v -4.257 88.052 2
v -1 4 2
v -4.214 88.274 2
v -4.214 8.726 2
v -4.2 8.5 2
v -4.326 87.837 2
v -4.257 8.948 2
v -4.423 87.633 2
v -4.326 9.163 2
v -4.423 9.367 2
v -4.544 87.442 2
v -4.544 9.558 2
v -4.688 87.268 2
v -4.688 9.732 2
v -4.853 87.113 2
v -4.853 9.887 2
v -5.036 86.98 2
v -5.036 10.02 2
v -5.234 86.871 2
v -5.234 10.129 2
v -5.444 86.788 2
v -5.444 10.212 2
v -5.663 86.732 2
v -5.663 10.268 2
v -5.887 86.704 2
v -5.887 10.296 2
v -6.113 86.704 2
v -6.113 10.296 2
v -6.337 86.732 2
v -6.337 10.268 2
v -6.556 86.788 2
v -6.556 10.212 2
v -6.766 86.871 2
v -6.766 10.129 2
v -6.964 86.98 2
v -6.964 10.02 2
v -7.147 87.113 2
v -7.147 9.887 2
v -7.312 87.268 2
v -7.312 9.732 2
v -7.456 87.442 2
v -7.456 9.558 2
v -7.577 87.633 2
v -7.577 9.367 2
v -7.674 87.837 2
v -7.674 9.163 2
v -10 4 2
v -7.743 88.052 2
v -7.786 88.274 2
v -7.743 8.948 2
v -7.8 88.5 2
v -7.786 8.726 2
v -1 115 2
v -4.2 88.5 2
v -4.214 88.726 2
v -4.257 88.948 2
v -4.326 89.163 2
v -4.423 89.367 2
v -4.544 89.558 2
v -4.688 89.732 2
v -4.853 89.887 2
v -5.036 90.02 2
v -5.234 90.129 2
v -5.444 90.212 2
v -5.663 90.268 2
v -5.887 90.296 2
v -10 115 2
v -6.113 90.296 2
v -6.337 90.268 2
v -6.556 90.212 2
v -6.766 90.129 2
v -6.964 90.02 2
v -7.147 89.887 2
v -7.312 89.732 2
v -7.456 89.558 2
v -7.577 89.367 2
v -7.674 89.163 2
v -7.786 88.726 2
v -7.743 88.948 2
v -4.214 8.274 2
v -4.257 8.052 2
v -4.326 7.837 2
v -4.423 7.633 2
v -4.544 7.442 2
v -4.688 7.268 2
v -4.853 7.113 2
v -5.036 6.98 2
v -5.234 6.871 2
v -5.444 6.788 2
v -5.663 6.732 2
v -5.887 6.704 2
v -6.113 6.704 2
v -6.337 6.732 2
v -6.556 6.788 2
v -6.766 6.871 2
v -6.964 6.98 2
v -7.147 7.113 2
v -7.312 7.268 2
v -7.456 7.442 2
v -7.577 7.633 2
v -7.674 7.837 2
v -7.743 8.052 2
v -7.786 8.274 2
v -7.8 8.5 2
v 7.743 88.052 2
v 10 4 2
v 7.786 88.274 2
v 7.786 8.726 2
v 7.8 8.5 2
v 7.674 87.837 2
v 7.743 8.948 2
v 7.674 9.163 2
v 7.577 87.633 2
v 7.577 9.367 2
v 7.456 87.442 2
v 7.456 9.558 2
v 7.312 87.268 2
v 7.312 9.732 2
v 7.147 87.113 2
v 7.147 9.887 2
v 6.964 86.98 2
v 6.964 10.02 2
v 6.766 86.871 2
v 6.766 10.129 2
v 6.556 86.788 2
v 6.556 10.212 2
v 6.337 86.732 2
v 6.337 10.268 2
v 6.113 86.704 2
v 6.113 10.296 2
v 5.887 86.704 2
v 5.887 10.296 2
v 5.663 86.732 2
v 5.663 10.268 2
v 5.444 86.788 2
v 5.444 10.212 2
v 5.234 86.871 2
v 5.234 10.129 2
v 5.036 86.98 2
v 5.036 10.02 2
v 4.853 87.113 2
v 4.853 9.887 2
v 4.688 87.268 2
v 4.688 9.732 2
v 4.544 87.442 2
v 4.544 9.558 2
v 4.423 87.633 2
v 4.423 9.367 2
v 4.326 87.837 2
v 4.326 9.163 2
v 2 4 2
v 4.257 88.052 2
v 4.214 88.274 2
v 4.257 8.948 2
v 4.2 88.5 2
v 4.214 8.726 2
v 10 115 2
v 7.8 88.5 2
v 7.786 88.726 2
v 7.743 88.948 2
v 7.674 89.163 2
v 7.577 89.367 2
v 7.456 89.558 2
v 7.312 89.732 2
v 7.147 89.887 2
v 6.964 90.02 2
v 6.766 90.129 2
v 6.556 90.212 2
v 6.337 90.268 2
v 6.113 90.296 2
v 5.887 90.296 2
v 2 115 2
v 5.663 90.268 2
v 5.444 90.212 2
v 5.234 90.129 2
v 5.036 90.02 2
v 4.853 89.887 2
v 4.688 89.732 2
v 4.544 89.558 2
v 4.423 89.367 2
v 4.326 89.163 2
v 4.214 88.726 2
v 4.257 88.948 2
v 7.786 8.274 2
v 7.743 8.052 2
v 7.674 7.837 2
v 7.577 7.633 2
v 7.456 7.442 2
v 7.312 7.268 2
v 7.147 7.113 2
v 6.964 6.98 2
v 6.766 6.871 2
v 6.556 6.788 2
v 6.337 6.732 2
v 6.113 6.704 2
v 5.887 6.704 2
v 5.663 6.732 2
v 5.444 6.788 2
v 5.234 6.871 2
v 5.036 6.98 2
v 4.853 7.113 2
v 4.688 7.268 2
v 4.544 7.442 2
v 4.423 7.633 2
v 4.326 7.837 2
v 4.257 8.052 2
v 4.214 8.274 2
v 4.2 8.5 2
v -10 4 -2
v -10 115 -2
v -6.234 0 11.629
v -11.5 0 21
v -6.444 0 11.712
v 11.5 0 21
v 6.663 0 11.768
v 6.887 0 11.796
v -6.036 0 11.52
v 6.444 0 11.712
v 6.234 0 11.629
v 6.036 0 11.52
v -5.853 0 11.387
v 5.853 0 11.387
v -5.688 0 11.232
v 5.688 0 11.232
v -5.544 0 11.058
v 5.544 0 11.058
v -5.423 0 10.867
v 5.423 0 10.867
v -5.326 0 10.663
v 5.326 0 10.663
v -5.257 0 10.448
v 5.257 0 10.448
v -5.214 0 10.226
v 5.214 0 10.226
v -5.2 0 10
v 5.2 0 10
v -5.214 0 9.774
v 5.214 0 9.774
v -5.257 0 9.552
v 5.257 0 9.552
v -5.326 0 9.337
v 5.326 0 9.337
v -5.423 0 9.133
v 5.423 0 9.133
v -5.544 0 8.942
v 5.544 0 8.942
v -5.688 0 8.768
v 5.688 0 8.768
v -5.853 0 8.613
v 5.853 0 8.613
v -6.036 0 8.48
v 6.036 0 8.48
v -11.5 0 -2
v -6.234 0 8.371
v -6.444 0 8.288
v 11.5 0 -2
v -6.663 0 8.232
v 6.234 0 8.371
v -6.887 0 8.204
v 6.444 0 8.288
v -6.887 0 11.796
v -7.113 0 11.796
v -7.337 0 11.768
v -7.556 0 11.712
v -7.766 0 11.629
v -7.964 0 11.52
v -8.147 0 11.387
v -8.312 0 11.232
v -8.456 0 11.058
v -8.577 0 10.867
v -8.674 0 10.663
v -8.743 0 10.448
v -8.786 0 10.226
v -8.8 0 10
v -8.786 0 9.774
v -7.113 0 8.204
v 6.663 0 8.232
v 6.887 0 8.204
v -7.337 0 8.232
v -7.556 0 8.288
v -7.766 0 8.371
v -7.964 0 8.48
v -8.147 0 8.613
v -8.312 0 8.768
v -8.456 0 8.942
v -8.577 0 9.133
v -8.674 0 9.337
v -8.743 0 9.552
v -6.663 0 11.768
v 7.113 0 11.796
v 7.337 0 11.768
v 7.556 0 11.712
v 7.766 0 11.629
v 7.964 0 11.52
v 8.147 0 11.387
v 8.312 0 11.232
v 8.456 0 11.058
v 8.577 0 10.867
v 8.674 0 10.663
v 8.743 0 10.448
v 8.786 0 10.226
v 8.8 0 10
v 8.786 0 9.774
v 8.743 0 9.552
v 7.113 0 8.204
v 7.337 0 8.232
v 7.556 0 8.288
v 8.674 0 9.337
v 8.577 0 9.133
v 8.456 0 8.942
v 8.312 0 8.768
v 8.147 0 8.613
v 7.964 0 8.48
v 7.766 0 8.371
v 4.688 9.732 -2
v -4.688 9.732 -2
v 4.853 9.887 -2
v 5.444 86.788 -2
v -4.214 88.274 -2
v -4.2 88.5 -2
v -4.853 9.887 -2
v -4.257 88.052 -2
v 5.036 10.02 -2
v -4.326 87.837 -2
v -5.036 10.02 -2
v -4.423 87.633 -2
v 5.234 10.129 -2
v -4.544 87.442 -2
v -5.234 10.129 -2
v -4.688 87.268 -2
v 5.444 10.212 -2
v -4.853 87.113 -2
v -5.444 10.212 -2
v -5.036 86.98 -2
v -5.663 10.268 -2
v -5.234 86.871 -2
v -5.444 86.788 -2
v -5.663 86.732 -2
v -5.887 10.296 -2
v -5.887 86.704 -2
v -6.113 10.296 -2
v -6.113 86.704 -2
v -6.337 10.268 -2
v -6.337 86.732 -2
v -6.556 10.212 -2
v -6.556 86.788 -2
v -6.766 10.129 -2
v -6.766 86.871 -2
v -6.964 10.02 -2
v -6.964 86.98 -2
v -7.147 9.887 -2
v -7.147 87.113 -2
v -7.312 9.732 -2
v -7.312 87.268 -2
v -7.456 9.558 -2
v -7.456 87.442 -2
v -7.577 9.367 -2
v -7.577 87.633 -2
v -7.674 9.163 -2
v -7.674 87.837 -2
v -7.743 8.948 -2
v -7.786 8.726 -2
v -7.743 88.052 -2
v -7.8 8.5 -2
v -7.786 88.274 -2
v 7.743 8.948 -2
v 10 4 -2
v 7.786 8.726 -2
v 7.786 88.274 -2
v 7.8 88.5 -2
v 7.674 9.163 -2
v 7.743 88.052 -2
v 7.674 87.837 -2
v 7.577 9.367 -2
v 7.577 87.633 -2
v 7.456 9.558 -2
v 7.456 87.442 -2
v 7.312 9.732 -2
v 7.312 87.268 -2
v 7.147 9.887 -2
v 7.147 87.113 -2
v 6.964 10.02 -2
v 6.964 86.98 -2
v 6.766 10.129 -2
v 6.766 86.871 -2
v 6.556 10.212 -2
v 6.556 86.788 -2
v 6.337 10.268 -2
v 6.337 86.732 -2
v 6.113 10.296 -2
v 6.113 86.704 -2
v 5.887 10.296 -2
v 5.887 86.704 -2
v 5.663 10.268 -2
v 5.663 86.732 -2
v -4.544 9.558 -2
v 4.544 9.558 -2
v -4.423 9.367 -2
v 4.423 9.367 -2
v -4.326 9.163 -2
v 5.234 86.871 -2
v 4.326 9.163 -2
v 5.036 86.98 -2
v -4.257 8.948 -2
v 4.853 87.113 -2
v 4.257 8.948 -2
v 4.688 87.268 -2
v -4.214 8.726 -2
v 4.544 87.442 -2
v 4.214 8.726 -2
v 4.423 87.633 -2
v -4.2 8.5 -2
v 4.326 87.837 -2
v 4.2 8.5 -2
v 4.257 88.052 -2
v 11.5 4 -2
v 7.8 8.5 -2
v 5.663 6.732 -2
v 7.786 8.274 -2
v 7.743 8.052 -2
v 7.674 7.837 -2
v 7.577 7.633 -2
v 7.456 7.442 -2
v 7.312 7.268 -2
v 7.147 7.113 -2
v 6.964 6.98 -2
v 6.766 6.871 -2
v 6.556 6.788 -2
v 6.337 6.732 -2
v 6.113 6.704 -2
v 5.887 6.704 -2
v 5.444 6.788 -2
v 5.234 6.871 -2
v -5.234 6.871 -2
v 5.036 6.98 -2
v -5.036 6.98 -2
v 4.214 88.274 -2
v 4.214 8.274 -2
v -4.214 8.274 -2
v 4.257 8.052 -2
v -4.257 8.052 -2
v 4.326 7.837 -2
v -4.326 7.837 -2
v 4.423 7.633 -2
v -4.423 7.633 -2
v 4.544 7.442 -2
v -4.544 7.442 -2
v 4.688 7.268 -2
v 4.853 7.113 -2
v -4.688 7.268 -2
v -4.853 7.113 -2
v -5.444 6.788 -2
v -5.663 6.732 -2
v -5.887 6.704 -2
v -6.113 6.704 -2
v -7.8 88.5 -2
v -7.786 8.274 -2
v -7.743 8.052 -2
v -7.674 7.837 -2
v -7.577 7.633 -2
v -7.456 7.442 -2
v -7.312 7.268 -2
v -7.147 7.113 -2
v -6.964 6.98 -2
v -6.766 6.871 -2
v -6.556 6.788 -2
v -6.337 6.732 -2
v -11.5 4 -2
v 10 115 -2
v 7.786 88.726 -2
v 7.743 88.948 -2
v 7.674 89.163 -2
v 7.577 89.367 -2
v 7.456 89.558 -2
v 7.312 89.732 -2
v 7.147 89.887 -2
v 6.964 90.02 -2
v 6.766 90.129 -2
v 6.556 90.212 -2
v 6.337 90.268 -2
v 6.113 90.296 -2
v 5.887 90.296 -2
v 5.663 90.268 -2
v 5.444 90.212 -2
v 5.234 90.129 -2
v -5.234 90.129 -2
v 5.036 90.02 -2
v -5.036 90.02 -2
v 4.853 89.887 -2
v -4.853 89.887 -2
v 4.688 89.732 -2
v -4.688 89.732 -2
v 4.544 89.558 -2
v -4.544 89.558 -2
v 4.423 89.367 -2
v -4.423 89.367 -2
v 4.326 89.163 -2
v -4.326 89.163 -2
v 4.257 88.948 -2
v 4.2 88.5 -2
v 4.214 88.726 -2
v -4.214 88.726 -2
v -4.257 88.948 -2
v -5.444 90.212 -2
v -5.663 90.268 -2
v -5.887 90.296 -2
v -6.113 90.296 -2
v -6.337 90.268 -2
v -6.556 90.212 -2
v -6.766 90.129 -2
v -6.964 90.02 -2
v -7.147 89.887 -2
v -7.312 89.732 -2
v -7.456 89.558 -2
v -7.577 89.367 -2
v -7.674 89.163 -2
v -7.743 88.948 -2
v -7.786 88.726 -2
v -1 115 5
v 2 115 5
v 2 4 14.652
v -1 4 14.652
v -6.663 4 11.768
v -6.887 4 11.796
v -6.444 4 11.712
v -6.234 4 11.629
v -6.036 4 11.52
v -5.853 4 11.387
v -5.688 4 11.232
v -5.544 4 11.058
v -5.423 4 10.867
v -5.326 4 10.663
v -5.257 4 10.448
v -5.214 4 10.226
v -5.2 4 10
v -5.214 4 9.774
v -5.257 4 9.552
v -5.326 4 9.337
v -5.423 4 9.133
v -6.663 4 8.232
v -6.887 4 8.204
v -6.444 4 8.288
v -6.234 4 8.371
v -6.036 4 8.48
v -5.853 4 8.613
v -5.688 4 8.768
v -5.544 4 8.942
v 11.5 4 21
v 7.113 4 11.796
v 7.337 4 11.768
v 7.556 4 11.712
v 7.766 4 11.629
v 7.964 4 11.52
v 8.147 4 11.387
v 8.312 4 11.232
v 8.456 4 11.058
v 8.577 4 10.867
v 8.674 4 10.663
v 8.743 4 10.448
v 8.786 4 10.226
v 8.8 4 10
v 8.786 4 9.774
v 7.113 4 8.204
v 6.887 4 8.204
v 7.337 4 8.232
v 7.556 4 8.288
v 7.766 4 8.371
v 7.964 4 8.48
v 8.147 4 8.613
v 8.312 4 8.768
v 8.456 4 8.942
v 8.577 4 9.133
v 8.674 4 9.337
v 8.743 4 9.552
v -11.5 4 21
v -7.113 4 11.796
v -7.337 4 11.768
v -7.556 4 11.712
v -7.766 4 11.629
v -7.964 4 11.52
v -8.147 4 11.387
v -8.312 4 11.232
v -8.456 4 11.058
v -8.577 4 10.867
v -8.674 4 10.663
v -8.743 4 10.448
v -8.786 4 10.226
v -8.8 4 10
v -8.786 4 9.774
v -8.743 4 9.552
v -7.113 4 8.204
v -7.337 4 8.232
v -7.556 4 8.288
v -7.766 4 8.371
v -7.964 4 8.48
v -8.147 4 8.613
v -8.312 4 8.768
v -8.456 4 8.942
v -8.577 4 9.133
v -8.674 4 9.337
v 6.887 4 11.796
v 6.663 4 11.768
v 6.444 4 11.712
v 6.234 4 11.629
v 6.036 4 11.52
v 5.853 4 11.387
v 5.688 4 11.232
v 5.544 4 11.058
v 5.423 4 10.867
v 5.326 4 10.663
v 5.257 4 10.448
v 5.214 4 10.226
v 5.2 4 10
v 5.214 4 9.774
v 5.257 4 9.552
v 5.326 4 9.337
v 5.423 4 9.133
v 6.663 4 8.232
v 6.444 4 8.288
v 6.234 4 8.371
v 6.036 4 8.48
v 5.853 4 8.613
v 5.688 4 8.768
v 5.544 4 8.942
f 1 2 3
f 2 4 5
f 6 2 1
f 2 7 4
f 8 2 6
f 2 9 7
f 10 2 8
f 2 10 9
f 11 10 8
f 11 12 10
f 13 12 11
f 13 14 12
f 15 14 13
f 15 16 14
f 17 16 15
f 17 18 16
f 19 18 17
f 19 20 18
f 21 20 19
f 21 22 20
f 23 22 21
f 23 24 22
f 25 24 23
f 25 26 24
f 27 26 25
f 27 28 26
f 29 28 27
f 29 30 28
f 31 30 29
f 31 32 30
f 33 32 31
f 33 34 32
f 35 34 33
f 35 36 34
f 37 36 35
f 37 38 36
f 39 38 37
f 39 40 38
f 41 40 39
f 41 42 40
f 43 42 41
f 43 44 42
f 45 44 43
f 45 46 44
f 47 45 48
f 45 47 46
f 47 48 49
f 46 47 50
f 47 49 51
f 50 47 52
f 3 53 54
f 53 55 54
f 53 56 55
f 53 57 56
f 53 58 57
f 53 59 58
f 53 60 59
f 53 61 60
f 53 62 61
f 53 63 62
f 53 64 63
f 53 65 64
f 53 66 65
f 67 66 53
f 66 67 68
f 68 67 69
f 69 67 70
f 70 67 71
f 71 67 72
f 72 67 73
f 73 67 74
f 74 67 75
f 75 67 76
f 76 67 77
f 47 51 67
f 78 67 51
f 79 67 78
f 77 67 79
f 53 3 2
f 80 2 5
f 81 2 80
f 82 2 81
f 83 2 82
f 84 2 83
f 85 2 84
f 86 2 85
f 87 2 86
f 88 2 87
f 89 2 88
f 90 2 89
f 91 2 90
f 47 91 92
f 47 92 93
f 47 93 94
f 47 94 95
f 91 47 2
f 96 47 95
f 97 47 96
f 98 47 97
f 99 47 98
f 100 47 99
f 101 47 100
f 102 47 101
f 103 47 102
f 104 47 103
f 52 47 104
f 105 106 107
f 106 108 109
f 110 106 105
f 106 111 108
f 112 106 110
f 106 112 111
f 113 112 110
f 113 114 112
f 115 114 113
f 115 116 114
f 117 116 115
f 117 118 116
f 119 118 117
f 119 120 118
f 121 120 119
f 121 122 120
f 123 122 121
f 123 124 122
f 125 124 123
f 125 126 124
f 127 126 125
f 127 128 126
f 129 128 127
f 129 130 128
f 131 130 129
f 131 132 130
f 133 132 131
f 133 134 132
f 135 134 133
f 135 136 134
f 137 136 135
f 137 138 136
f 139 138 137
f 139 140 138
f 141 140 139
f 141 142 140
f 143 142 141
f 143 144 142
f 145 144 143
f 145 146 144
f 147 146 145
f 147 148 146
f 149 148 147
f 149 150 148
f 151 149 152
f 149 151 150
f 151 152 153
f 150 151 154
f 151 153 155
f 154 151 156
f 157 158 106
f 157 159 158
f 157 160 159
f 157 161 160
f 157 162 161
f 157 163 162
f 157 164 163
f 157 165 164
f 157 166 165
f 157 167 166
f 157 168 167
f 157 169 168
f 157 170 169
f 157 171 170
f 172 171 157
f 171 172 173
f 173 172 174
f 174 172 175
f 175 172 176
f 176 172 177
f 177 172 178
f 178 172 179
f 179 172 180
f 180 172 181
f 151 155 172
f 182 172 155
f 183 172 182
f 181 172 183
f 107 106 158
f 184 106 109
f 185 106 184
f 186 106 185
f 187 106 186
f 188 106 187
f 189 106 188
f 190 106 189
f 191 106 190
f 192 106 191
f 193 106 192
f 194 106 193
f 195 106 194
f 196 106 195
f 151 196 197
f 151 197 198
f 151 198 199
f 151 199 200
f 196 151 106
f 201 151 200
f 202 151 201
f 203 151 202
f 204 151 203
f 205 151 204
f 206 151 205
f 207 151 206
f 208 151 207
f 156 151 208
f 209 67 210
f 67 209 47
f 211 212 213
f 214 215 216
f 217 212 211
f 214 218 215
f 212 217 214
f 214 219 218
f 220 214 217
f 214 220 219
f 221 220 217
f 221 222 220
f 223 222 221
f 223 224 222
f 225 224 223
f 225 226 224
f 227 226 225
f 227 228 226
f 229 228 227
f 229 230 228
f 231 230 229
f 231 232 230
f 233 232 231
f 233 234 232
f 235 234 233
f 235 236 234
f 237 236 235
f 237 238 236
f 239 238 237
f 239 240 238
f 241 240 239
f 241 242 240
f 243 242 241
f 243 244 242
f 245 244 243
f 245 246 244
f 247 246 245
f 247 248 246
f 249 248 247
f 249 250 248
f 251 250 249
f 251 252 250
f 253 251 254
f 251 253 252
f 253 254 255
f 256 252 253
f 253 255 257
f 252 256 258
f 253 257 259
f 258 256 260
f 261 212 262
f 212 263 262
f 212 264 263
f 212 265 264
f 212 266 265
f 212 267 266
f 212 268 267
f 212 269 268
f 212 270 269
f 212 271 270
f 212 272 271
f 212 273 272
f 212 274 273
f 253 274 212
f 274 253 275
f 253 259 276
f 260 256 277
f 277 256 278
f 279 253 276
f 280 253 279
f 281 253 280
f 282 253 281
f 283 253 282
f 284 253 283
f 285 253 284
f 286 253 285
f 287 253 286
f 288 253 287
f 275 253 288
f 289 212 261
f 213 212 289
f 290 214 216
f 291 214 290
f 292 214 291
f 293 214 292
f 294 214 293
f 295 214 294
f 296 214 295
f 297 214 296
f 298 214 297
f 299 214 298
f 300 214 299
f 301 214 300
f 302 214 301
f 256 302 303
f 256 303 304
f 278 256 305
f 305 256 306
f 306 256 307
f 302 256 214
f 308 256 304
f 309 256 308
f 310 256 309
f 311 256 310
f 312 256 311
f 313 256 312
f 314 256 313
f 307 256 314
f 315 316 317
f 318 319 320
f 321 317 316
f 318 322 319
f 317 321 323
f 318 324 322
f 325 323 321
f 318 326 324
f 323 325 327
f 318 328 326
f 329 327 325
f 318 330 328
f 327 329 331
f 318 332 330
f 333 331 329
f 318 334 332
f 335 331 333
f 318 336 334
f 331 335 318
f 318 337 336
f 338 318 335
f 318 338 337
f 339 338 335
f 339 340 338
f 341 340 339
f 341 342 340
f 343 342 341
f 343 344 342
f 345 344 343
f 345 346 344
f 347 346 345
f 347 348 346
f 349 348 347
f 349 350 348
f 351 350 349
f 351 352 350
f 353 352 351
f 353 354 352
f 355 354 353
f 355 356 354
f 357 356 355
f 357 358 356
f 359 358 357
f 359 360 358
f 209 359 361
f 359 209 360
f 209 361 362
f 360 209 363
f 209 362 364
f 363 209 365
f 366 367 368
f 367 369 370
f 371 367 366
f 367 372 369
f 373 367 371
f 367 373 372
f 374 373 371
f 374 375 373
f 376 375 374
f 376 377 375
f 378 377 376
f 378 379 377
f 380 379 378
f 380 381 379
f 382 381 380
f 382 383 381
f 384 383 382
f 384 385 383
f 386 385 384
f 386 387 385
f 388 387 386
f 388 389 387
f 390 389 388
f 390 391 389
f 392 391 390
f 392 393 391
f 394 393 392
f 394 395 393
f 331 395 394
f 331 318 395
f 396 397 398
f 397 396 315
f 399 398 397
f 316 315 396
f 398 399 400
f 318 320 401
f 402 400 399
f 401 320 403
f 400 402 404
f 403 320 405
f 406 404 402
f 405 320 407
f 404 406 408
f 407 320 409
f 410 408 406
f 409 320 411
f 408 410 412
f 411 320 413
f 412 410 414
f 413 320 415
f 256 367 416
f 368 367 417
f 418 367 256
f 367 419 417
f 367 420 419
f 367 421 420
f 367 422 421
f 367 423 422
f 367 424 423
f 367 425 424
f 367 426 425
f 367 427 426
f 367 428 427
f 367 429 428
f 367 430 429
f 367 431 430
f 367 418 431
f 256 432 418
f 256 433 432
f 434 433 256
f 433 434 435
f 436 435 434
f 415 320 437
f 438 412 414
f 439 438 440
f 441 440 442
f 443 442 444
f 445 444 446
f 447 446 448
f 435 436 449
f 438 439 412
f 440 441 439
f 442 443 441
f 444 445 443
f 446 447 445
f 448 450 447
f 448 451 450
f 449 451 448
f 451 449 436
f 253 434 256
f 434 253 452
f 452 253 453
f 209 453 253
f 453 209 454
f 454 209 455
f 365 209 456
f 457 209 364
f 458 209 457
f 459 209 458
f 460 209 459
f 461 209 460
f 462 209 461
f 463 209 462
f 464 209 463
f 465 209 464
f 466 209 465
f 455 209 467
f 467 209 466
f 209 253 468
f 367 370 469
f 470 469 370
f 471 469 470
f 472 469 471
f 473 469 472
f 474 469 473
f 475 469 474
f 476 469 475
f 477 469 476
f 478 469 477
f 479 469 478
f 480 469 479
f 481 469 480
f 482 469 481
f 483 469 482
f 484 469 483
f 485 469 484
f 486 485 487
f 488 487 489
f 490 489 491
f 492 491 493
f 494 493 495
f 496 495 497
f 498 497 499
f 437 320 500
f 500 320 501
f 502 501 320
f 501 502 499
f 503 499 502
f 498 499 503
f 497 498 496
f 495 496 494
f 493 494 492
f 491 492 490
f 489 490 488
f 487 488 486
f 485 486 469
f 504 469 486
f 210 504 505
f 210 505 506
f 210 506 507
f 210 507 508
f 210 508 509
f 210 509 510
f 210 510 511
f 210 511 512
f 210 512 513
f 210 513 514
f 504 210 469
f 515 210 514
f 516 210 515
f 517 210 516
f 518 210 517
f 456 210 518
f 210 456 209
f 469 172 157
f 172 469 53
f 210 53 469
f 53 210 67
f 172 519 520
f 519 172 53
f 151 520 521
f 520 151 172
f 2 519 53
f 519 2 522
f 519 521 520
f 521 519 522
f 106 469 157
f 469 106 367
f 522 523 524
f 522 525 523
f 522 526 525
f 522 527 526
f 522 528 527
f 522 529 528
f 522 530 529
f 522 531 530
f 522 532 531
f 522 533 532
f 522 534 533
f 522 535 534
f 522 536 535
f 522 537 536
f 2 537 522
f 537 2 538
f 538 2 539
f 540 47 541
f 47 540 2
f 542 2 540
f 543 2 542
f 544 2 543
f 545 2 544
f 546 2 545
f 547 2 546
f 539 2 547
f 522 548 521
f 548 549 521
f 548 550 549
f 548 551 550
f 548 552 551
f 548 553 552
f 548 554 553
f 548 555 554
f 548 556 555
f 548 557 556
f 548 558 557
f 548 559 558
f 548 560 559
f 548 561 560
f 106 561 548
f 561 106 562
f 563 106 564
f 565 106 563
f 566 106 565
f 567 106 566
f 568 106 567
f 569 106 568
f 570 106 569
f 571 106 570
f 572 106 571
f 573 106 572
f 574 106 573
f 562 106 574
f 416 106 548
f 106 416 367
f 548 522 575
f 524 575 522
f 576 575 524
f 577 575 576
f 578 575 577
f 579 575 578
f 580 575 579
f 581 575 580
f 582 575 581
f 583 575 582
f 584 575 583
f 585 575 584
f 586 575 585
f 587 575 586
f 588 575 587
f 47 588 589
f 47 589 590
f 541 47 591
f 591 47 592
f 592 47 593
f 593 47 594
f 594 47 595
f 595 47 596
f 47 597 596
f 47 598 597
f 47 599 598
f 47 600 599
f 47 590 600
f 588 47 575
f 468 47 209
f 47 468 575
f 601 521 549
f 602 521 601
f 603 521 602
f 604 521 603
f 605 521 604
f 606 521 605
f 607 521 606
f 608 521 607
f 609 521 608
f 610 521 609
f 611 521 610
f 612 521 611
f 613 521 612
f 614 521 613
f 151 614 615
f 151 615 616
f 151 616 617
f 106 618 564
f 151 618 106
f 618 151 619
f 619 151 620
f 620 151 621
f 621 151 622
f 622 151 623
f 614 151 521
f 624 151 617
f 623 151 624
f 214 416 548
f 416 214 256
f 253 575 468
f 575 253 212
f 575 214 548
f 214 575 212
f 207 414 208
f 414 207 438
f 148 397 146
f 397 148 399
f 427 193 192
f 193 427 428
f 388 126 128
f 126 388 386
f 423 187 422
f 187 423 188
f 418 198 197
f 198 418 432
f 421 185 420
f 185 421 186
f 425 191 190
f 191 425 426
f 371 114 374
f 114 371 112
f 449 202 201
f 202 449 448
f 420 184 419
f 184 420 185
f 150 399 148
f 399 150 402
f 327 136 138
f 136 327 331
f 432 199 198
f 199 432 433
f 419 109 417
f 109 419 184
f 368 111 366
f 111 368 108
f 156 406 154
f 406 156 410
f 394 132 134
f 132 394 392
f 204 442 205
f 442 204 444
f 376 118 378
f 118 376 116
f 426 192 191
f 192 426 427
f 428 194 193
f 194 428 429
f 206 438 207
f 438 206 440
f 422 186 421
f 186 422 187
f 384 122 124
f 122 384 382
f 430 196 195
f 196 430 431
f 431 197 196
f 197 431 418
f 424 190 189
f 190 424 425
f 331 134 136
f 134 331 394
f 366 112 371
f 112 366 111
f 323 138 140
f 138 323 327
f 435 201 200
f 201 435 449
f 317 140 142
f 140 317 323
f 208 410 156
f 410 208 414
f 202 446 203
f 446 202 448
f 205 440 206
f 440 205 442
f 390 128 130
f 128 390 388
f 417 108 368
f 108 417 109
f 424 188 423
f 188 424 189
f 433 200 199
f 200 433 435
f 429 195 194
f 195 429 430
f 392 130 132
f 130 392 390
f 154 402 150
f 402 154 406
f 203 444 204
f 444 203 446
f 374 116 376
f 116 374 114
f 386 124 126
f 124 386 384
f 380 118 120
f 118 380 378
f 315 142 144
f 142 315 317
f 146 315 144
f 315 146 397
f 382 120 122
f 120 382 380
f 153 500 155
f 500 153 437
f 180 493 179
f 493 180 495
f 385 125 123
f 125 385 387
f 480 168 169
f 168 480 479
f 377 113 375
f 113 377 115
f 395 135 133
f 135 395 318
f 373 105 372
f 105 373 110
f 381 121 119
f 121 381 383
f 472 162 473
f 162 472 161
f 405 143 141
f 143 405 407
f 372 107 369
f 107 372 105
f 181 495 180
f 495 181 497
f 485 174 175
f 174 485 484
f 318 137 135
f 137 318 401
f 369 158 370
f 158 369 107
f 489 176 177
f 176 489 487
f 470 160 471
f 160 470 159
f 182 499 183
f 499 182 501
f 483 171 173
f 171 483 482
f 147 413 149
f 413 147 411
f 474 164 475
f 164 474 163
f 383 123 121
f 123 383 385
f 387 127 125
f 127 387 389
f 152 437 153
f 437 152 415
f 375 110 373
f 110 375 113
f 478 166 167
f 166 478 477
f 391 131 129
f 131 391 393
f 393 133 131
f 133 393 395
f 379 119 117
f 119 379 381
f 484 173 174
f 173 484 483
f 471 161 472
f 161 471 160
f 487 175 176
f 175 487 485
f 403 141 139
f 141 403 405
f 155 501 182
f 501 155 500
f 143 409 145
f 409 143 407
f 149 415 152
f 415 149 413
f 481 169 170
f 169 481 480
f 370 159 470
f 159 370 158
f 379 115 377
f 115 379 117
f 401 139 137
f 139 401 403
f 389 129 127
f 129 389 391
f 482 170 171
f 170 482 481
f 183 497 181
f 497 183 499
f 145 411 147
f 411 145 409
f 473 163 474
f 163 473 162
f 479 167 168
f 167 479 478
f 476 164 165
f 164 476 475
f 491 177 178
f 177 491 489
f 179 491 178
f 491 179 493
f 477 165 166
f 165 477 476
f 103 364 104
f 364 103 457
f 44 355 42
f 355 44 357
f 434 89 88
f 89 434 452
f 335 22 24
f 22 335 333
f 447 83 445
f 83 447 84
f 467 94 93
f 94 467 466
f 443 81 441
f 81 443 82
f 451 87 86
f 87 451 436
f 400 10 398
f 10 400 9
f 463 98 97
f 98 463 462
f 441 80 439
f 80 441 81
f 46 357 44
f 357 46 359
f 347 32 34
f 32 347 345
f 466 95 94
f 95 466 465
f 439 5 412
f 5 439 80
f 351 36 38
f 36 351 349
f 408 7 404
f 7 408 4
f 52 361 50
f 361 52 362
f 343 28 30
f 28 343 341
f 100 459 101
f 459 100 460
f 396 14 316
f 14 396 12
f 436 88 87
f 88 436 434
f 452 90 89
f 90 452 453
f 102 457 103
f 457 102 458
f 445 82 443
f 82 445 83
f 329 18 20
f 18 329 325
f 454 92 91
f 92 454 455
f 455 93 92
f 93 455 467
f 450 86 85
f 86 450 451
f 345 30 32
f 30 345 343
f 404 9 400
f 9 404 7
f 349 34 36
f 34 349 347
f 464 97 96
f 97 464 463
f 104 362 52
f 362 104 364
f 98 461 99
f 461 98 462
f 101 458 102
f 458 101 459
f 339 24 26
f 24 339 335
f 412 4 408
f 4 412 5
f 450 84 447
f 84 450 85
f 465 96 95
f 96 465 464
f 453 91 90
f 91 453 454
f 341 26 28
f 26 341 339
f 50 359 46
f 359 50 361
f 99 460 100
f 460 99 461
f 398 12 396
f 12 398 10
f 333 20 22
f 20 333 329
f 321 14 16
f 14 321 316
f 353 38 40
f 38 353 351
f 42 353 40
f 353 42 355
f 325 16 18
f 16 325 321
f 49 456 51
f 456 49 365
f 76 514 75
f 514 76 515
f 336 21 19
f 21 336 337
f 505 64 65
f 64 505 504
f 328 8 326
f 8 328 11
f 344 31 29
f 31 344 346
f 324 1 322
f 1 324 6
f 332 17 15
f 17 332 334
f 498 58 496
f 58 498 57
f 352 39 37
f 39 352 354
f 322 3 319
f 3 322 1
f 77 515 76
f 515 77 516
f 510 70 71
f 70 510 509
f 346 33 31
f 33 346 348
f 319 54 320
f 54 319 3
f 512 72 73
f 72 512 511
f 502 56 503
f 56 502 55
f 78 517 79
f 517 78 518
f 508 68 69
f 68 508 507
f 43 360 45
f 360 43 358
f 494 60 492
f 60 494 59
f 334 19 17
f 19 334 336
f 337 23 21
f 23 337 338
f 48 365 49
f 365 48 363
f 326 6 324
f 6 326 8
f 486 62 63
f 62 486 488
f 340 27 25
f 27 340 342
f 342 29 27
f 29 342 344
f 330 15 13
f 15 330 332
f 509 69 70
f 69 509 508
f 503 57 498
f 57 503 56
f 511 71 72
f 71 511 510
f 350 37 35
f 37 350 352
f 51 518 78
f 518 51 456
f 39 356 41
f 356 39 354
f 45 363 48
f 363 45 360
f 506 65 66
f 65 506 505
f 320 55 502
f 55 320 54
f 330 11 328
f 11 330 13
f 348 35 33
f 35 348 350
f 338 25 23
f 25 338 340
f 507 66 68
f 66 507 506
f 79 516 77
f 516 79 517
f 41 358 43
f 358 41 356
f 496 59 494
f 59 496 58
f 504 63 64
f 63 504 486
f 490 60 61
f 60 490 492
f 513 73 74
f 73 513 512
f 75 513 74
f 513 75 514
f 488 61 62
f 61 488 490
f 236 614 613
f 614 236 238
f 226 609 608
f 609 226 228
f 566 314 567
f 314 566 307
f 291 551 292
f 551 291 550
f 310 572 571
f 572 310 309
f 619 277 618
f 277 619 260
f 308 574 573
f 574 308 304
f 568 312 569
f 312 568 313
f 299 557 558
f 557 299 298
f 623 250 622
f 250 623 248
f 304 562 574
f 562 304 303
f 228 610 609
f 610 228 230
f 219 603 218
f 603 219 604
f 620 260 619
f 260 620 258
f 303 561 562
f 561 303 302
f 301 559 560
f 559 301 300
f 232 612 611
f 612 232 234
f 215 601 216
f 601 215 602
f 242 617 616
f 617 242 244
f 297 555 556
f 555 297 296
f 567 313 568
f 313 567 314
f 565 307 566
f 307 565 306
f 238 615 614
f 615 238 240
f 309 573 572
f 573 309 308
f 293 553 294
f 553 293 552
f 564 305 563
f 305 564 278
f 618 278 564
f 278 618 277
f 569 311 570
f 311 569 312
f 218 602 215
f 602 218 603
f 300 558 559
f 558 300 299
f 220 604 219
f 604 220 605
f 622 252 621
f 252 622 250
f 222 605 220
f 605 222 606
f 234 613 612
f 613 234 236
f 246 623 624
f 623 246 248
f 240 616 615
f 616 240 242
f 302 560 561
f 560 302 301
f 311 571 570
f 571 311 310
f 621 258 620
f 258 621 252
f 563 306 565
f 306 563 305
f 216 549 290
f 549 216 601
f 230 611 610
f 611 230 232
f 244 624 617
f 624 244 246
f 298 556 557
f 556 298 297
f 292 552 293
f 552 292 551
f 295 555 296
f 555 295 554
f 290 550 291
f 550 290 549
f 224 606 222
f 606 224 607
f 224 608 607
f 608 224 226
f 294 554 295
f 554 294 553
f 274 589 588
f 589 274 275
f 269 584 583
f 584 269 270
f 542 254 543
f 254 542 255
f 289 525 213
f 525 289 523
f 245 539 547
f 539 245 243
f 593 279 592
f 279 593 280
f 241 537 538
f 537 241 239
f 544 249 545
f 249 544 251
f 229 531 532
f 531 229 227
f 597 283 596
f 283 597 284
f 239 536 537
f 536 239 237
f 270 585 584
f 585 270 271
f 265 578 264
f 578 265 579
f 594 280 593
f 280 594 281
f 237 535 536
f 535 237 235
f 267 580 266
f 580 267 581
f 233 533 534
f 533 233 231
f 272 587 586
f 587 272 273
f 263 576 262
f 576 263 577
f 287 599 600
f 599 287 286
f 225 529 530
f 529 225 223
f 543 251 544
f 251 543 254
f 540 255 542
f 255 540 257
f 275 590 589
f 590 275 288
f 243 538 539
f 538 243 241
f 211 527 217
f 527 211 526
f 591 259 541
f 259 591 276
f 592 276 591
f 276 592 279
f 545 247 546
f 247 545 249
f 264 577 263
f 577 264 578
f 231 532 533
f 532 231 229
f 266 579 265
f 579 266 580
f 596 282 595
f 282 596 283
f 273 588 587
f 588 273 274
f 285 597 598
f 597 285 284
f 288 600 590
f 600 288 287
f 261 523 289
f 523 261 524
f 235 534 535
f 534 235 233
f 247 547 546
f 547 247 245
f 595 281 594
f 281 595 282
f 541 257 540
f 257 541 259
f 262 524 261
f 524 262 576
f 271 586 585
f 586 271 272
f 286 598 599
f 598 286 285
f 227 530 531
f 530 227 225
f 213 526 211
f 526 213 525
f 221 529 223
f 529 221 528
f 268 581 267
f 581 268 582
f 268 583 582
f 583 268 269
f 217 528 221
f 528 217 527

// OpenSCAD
$fn = 50;

bottom_mount_holes = [[-7, 0, -8], [7, 0, -8]];

// pnp
//pletwa_length = 30; 
//mount_holes = [[6, 45, 0], [6, 105, 0]]; 
//line_length = 125;

// pnp vertical
mount_holes = [[-6, 8.5, 0], [-6, 8.5 + 80, 0], [6, 8.5, 0], [6, 8.5 + 80, 0]]; 
pletwa_length = 115;
line_length = 115;

//heater
//mount_holes = [[-6, 8.5, 0], [-6, 8.5 + 104, 0], [6, 8.5, 0], [6, 8.5 + 104, 0]]; 
//pletwa_length = 120;
//line_length = 120;



module pletwa(h1, h2, t, l) {
    translate([0, 0, -2])
    linear_extrude(height=t)
    polygon([[0, 0], [0, l], [h2, l], [h1, 0]]);
}

module bottom_mount() {
    rotate([90, 0, 0])
    translate([0, (-23 + 4)/2, -4])
    linear_extrude(height=4)  
    square([23, 23], center=true);
}

module body() {
    pletwa(h1=10, h2=10, t=4, l=line_length);
    rotate([0, 90, 0])
    pletwa(h1=15, h2=5, t=3, l=pletwa_length);
    rotate([0, 180, 0])
    pletwa(h1=10, h2=10, t=4, l=line_length);
    bottom_mount();
}

rotate([0, 180, 0])
difference() {
    body();
    
    for (pos = mount_holes) {
        translate(pos)
        translate([0, 0, -2])
        linear_extrude(4)
        circle(d=3.6);
    }
    
    for (pos = bottom_mount_holes) {
        translate(pos)
        translate([0, 0, -2])
        rotate([270, 0, 0])
        linear_extrude(4)
        circle(d=3.6);
    }

}
